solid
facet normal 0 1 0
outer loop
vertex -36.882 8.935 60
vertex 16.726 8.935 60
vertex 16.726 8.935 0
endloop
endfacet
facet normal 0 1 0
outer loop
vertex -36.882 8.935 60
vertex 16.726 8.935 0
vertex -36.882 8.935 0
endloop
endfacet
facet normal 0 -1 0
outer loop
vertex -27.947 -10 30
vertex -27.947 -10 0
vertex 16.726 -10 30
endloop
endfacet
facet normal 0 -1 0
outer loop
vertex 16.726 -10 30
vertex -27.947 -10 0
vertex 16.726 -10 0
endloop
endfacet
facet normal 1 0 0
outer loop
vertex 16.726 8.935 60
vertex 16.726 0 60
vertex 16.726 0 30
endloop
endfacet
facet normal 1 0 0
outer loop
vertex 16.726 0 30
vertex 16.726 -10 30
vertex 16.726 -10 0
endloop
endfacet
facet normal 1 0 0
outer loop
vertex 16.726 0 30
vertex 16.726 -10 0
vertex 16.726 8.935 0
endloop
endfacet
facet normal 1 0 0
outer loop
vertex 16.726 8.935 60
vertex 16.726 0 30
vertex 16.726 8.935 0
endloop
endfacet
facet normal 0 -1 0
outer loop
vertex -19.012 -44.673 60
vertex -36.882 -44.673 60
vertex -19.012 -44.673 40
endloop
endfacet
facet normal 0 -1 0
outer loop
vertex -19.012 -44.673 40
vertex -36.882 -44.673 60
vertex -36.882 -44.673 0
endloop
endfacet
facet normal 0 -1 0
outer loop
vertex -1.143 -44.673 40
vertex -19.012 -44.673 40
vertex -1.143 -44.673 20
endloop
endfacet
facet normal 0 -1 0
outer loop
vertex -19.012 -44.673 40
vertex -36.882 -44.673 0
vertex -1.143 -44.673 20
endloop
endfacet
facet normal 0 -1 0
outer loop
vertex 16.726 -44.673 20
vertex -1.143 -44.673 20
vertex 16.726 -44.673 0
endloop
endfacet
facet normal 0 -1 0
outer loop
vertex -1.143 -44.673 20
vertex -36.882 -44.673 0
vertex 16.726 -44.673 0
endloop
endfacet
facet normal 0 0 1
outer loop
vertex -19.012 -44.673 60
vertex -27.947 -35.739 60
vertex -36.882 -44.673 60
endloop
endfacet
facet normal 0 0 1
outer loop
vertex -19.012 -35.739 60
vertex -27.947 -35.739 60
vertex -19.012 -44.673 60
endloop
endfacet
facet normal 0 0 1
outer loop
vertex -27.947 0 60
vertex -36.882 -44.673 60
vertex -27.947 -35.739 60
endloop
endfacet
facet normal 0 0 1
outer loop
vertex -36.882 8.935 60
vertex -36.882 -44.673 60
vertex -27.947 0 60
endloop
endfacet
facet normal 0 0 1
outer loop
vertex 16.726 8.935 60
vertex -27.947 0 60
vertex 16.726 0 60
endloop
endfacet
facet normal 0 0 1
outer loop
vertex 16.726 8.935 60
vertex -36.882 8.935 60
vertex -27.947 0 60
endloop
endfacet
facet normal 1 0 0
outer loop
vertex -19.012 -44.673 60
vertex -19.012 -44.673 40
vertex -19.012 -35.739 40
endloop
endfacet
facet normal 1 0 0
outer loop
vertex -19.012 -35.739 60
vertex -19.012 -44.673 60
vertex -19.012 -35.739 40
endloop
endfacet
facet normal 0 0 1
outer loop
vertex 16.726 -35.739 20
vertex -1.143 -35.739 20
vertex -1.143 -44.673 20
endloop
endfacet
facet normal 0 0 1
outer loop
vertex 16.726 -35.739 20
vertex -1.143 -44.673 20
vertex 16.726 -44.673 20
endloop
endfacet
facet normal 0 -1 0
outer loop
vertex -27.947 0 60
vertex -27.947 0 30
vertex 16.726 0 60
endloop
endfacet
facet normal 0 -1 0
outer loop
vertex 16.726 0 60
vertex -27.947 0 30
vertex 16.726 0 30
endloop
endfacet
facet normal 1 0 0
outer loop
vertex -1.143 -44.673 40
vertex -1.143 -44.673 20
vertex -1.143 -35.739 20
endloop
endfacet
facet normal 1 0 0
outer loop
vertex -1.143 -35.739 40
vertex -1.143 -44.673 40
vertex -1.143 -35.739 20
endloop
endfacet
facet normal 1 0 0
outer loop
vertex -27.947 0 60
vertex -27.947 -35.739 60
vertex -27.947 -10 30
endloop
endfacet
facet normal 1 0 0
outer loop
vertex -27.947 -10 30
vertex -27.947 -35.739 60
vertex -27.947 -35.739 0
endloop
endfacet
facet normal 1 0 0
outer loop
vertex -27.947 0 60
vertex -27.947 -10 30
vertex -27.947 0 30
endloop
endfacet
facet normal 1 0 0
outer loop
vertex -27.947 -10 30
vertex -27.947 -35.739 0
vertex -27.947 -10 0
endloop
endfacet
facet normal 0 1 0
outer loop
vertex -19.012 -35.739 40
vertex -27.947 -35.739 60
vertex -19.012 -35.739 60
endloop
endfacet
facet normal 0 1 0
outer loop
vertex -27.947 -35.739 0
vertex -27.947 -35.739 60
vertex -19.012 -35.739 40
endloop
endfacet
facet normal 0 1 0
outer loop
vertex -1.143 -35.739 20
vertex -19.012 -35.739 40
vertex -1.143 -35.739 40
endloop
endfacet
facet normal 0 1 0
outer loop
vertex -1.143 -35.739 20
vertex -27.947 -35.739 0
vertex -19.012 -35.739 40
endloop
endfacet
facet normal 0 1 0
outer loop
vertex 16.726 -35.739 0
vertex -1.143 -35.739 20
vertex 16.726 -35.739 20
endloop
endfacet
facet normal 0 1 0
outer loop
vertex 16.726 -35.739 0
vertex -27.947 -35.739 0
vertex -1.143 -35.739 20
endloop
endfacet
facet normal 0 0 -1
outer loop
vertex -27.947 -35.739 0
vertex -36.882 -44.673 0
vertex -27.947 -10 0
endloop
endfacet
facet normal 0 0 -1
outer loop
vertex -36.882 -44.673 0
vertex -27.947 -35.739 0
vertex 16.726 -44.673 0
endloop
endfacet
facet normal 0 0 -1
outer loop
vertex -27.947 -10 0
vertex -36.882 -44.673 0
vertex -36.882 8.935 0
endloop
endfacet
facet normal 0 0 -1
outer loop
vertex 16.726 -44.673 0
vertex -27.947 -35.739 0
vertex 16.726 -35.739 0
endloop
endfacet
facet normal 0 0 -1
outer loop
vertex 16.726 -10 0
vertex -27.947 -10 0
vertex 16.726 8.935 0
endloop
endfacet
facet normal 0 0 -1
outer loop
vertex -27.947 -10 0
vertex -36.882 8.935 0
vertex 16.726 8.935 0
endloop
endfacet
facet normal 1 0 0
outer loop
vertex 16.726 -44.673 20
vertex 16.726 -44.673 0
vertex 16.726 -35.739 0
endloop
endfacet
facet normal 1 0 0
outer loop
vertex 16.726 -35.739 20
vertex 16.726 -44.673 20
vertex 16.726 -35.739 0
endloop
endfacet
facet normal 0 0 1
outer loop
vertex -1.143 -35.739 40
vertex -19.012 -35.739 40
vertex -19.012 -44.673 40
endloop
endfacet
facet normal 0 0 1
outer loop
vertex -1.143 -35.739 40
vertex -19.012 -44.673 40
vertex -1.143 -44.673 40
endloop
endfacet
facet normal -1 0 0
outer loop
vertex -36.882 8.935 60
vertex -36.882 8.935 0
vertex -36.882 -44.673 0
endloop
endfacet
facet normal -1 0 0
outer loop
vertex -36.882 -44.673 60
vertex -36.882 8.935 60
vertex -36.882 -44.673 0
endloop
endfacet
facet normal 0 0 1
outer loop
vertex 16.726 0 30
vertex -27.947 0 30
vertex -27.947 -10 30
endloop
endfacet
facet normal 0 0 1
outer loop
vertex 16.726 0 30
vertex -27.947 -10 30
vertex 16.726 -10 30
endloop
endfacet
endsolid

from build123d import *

# Parameters (mm, degrees)
F1_DEPTH = 60
F0_W     = 44.673472
F0_H     = 10
F2_DEPTH = 30
F0_W_2   = 17.869388
F0_H_2   = 8.934694
F3_DEPTH = 40
F0_W_3   = 17.869389
F4_DEPTH = 20


with BuildPart() as f1:
    # F0 (on Top) → F1 (new body)
    with BuildSketch(Plane.XY):
        Polygon((16.726474, 8.934694), (-36.881692, 8.934694), (-36.881692, -44.673472), (-19.012303, -44.673472), (-19.012303, -35.738778), (-27.946998, -35.738778), (-27.946998, -10), (-27.946998, 0), (16.726474, 0), align=None)
    extrude(amount=F1_DEPTH)

    # F0 (on Top) → F2 (join)
    with BuildSketch(Plane.XY):
        with Locations((-5.610262, -5)):
            Rectangle(F0_W, F0_H)
    extrude(amount=F2_DEPTH)

    # F0 (on Top) → F3 (join)
    with BuildSketch(Plane.XY):
        with Locations((-10.077609, -40.206125)):
            Rectangle(F0_W_2, F0_H_2)
    extrude(amount=F3_DEPTH)

    # F0 (on Top) → F4 (join)
    with BuildSketch(Plane.XY):
        with Locations((7.791779, -40.206125)):
            Rectangle(F0_W_3, F0_H_2)
    extrude(amount=F4_DEPTH)


solid = f1.part
